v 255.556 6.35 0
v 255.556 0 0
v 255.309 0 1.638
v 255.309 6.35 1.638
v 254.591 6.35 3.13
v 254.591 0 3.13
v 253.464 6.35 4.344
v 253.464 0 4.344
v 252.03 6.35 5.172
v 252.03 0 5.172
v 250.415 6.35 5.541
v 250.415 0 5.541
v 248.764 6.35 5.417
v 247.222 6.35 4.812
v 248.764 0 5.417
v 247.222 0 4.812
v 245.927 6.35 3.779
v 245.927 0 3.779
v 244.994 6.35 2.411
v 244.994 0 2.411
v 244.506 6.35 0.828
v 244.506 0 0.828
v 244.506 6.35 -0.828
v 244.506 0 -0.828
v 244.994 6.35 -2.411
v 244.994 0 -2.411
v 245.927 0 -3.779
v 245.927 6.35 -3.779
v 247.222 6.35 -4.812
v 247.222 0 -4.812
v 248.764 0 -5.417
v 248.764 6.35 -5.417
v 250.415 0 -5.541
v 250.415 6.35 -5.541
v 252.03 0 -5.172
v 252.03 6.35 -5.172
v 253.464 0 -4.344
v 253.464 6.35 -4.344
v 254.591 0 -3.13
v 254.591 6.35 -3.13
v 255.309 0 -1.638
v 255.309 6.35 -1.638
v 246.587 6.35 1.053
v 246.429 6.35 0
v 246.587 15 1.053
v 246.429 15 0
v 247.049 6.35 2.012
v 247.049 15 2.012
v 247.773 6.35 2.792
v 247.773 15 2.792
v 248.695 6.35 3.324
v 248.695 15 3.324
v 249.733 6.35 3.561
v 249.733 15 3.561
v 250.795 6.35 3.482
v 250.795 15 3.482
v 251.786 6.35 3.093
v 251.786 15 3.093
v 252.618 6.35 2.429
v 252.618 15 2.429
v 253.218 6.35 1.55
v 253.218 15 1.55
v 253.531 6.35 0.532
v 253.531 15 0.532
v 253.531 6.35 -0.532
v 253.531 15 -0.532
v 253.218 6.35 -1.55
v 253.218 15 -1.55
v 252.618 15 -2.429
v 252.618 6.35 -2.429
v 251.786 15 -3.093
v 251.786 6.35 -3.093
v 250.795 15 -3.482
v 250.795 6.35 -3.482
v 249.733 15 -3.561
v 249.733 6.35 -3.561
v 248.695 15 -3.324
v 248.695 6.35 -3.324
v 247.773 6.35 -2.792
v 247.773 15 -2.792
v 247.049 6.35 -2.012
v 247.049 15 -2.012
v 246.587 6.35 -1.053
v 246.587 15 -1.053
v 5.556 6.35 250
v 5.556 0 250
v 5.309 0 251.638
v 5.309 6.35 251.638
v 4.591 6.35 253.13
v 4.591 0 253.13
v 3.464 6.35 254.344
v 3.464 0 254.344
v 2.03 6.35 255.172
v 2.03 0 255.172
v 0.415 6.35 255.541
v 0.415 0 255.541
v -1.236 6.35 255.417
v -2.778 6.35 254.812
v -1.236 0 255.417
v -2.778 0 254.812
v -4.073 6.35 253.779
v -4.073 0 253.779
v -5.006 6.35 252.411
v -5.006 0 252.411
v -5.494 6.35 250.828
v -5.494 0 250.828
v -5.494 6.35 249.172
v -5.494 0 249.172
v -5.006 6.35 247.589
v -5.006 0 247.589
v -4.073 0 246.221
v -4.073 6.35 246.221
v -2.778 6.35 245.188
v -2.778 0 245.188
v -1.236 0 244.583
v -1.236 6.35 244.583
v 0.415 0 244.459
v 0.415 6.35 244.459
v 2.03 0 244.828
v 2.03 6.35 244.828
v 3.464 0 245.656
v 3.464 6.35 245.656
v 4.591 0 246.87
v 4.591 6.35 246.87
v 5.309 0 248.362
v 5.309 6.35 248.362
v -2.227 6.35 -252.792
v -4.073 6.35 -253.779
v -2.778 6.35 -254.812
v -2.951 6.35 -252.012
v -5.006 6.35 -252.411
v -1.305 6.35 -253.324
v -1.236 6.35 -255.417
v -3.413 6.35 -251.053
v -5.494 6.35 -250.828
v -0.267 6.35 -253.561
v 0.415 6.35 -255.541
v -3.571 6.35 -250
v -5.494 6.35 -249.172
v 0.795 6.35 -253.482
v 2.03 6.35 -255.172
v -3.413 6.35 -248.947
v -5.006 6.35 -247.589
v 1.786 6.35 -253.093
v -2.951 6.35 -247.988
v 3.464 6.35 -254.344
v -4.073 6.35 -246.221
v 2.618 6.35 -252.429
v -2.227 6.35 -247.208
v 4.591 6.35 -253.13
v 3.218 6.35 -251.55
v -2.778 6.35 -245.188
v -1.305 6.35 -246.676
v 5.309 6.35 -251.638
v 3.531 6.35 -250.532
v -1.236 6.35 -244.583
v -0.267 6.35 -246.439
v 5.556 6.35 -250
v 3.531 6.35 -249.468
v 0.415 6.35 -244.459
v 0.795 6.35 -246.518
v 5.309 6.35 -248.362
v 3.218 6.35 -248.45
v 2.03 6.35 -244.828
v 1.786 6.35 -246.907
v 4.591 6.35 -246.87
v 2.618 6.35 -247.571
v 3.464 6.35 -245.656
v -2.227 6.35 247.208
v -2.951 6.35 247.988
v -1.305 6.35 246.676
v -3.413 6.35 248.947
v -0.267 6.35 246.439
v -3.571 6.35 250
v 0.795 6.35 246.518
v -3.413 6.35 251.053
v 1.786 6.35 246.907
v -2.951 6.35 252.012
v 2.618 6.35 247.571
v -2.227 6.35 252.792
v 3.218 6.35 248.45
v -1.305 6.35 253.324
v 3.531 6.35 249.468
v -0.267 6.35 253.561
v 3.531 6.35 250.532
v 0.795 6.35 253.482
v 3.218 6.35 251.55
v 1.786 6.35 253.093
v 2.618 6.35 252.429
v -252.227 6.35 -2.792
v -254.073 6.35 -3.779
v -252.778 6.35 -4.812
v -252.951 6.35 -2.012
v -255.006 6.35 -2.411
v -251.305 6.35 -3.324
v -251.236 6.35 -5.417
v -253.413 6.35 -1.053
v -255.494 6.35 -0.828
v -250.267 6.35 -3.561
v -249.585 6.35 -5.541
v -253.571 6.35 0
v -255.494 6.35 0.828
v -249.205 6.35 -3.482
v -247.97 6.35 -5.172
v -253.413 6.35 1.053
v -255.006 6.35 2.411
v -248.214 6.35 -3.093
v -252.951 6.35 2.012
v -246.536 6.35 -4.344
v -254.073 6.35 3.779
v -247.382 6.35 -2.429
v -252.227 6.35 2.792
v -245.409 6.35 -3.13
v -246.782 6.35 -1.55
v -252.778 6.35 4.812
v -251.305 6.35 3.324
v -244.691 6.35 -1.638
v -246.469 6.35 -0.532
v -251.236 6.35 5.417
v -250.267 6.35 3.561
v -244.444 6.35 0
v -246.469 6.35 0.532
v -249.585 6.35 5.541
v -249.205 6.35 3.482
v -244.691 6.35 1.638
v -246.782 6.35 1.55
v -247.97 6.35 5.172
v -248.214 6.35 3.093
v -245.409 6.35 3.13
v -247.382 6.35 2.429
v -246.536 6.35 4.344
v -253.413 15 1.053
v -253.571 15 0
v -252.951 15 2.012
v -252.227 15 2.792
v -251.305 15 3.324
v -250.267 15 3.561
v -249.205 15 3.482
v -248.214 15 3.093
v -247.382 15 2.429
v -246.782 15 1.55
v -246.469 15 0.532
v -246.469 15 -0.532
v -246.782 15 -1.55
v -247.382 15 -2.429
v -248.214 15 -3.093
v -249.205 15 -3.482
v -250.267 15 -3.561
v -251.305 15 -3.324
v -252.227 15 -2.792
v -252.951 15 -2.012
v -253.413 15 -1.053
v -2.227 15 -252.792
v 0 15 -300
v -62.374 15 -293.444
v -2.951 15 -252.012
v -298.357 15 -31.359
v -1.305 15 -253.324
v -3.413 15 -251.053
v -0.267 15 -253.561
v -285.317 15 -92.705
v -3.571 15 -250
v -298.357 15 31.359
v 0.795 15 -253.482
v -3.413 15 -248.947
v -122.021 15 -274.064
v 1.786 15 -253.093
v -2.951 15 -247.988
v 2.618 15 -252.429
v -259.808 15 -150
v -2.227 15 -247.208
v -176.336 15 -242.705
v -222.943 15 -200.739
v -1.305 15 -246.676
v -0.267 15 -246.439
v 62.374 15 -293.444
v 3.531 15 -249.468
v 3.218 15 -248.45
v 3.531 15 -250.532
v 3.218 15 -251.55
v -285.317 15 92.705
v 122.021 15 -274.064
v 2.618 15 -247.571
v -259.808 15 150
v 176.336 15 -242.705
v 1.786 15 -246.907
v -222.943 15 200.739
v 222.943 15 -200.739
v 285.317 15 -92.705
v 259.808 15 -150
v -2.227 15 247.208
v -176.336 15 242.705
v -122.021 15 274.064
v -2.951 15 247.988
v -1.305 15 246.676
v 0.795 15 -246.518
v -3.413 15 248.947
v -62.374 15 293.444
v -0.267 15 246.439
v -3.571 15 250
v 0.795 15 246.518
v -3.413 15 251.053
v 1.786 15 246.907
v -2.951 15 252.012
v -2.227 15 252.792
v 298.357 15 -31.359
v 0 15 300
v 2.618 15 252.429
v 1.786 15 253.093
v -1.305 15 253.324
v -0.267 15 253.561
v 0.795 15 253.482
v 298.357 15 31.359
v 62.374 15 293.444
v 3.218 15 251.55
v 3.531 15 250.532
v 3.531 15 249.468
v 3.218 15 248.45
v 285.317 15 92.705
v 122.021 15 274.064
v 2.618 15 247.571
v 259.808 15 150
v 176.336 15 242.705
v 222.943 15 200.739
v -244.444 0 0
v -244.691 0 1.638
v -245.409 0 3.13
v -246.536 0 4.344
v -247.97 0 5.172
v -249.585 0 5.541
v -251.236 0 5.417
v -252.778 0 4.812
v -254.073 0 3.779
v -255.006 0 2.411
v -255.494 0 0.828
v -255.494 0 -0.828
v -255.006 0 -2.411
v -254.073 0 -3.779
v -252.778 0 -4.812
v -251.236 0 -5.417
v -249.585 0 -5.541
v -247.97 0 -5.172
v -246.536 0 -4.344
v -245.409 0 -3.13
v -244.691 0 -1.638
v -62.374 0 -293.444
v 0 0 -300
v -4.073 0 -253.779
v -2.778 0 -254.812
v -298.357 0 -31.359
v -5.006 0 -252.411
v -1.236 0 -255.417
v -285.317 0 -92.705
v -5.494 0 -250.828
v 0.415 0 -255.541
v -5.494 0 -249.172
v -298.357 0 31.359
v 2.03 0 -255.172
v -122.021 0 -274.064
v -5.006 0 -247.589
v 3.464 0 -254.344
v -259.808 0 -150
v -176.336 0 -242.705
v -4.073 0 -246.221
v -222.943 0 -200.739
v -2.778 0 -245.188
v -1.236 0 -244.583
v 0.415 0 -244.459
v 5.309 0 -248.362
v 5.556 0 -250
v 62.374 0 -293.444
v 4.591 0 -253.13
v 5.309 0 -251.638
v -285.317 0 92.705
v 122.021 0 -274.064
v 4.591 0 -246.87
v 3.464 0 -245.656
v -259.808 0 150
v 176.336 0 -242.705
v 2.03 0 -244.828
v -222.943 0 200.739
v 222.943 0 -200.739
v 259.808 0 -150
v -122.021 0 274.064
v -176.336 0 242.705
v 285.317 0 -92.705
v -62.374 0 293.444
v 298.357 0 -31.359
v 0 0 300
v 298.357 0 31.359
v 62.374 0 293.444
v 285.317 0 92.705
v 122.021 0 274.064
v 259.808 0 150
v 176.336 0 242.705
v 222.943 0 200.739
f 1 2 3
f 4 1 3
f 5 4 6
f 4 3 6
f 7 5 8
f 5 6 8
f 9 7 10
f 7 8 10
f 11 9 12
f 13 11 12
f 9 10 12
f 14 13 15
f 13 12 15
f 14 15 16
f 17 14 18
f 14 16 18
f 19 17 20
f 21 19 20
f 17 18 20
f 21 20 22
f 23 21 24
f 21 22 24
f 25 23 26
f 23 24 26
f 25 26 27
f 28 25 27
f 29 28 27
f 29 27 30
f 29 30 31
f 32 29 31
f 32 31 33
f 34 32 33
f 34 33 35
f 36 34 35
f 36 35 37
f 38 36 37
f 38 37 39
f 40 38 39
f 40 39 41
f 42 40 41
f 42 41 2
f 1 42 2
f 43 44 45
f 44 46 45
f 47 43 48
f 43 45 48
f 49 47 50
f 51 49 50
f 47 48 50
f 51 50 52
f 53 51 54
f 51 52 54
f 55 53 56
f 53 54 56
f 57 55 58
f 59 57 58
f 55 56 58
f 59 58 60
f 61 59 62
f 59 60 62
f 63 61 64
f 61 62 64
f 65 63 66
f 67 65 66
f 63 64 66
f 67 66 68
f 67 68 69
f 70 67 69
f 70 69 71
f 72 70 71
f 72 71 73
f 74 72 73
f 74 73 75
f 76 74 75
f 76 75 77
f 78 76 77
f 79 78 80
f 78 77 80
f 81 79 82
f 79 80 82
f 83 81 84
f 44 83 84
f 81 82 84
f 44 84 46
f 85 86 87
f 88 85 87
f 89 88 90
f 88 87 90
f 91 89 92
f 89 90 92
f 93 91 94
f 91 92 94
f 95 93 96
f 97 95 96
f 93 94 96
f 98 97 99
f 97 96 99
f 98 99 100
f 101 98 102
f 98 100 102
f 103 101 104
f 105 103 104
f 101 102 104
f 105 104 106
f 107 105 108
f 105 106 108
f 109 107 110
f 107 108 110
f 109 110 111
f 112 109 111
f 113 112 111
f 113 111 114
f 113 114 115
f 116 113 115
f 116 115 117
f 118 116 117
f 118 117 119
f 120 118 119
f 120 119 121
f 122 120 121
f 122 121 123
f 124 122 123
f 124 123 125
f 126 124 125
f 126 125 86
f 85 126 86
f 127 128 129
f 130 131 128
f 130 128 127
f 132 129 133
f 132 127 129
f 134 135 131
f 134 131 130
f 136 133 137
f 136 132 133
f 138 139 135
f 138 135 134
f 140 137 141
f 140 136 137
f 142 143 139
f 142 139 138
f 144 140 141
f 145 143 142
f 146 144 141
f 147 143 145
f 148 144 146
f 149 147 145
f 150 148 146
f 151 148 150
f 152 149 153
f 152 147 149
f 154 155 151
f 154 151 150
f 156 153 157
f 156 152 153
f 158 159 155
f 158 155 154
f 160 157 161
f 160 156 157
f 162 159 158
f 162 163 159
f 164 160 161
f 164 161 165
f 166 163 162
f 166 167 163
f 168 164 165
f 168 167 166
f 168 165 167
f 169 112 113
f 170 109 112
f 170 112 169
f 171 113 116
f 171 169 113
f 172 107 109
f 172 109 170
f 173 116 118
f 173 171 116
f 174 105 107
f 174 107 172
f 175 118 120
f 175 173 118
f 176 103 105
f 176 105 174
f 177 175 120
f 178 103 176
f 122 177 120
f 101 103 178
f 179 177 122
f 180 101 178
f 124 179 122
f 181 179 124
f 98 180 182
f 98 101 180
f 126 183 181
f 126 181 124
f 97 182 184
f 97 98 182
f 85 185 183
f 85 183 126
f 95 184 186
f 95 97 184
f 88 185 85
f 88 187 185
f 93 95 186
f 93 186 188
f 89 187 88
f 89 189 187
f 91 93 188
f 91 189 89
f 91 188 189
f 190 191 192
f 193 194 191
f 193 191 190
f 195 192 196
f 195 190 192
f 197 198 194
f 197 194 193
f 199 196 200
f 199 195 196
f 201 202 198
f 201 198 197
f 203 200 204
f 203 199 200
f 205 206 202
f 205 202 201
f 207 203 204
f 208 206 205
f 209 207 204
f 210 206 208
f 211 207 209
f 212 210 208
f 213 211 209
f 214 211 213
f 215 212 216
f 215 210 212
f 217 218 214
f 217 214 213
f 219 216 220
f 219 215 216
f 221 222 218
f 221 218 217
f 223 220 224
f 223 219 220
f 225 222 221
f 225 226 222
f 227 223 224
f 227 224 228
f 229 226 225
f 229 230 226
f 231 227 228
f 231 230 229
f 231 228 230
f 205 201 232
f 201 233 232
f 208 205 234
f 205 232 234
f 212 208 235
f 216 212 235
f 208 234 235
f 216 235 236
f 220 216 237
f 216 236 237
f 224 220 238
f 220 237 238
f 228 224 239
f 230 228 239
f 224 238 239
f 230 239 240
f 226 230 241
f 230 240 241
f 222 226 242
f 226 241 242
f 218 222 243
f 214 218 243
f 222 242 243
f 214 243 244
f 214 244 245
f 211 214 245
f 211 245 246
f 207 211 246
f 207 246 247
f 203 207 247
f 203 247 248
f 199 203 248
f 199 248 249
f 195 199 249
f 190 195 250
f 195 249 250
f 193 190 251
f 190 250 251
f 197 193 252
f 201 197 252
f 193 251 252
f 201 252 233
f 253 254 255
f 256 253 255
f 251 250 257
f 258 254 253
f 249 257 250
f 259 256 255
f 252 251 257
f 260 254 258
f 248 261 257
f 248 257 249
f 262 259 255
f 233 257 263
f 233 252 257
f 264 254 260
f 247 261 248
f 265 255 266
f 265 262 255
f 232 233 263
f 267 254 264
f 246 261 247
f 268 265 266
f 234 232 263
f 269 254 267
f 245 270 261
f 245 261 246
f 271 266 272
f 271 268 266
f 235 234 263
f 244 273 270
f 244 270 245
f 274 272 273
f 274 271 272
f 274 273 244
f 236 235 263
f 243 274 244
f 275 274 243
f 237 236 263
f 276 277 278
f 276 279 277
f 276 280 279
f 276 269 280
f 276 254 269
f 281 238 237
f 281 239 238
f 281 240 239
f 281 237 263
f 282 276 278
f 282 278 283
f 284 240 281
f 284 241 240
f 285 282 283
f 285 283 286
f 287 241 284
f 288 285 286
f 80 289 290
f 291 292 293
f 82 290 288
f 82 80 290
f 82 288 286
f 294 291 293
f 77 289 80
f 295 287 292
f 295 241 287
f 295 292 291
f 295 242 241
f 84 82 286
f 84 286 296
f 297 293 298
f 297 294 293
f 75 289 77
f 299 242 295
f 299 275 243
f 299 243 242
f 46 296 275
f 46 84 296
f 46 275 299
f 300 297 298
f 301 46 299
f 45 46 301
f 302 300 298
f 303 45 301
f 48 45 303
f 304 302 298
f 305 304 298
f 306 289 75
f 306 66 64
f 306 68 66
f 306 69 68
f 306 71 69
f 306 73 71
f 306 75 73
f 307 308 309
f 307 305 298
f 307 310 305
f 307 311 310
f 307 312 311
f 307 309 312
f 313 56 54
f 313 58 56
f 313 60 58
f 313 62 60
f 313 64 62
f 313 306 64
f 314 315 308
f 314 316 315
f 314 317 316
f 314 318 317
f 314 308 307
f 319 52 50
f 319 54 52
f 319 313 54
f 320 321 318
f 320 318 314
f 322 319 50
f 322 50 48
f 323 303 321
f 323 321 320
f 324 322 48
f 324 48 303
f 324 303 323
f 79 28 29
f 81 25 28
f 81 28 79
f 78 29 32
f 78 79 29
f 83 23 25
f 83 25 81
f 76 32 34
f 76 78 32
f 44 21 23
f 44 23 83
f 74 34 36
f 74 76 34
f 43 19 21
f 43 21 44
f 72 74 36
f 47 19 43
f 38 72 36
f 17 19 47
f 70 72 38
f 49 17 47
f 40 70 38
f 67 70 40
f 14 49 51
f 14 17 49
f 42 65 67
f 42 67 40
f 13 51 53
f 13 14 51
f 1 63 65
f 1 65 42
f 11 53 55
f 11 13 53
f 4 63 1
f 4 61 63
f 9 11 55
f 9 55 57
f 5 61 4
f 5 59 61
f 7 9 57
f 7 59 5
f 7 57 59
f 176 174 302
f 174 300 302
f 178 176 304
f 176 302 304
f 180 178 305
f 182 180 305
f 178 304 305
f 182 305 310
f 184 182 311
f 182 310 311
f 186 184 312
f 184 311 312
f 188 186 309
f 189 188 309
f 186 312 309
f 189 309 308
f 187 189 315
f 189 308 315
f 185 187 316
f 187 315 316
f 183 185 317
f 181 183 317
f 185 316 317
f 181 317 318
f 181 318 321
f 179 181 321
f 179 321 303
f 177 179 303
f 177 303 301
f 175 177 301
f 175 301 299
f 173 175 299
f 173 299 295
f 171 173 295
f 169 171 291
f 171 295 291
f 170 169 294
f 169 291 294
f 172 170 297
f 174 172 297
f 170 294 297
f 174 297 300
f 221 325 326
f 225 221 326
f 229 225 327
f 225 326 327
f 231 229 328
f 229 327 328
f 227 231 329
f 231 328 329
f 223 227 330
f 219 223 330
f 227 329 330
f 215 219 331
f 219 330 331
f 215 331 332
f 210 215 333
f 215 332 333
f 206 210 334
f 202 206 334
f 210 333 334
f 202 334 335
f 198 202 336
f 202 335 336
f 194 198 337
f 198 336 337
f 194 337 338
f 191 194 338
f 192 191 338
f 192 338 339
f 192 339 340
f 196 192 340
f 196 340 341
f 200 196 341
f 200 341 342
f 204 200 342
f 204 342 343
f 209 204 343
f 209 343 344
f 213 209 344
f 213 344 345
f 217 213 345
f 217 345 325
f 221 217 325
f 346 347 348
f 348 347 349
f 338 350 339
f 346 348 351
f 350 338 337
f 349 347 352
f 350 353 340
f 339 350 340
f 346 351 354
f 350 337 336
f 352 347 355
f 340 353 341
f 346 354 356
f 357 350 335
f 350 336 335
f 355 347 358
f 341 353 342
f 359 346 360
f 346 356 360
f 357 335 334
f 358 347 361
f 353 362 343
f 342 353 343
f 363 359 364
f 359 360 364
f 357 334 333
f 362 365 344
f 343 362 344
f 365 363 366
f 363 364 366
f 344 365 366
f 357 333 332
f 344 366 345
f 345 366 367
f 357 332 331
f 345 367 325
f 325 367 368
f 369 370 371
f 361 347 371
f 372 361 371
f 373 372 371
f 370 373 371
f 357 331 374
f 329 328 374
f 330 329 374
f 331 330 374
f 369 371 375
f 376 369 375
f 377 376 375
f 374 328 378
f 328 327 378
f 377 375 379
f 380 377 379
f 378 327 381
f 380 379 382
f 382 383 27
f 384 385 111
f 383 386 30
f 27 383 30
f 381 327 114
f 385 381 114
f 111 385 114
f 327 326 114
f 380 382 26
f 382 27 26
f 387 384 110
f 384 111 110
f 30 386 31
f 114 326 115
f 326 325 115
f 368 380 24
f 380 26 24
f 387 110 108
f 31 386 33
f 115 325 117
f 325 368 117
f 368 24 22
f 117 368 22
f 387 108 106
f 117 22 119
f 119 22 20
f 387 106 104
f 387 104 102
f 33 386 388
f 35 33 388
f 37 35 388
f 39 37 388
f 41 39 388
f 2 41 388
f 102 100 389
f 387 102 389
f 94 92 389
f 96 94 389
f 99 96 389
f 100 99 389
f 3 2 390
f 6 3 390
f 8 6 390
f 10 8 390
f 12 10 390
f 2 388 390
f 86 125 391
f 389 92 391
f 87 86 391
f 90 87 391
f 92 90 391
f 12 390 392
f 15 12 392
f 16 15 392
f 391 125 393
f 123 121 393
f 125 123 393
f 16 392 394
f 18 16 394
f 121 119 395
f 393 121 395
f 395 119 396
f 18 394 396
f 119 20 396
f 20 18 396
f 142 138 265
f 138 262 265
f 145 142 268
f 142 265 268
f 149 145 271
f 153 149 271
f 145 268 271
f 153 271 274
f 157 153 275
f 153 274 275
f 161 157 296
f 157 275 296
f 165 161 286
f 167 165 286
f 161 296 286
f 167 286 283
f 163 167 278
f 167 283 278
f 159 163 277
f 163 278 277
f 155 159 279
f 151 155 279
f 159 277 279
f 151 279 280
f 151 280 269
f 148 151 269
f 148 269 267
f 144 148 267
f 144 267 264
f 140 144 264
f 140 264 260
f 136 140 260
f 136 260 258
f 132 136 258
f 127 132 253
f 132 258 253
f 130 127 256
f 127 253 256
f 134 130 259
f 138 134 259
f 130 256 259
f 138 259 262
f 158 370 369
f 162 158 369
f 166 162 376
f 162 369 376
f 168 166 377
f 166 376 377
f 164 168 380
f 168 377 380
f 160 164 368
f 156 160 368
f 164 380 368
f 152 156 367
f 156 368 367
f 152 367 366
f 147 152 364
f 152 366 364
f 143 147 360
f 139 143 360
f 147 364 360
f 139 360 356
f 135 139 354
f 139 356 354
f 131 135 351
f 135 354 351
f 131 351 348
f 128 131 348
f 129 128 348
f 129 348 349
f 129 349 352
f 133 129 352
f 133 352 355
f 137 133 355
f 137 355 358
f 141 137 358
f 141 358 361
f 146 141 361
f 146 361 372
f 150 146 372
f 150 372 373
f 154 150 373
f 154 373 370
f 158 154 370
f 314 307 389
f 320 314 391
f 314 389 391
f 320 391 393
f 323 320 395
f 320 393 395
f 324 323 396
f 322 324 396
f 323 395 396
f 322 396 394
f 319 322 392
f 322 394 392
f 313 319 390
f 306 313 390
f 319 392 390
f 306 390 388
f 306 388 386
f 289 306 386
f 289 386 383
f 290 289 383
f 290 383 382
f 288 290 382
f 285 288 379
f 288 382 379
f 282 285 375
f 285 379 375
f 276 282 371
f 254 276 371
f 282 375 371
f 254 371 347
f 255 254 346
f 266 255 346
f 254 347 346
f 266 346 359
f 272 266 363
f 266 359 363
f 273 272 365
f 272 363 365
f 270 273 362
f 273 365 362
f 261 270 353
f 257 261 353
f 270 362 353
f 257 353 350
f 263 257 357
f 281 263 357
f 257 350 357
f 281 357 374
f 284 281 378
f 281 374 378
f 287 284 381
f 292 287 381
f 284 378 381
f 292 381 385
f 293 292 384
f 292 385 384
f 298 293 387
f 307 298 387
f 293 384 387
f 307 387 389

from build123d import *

# Parameters (mm, degrees)
SKETCH1_R                                        = 300
BOSS_EXTRUDE1_DEPTH                              = 15
CBORE_FOR_1_4_SOCKET_HEAD_CAP_SCREW1_D           = 7.14248
CBORE_FOR_1_4_SOCKET_HEAD_CAP_SCREW1_CBORE_D     = 11.1125
CBORE_FOR_1_4_SOCKET_HEAD_CAP_SCREW1_CBORE_DEPTH = 6.35


with BuildPart() as part:
    # Sketch1 → Boss-Extrude1 (new body)
    with BuildSketch(Plane(origin=(0, 0, 0), x_dir=(1, 0, 0), z_dir=(0, 1, 0))):
        with Locations(Location((0, 0, 0), (0, 0, 270))):
            Circle(SKETCH1_R)
    extrude(amount=BOSS_EXTRUDE1_DEPTH)

    # CBORE for 1/4 Socket Head Cap Screw1 (through all)
    with Locations(Plane.XZ):
        with Locations((-250, 0), (0, -250), (250, 0), (0, 250)):
            CounterBoreHole(CBORE_FOR_1_4_SOCKET_HEAD_CAP_SCREW1_D / 2, CBORE_FOR_1_4_SOCKET_HEAD_CAP_SCREW1_CBORE_D / 2, CBORE_FOR_1_4_SOCKET_HEAD_CAP_SCREW1_CBORE_DEPTH)


solid = part.part
